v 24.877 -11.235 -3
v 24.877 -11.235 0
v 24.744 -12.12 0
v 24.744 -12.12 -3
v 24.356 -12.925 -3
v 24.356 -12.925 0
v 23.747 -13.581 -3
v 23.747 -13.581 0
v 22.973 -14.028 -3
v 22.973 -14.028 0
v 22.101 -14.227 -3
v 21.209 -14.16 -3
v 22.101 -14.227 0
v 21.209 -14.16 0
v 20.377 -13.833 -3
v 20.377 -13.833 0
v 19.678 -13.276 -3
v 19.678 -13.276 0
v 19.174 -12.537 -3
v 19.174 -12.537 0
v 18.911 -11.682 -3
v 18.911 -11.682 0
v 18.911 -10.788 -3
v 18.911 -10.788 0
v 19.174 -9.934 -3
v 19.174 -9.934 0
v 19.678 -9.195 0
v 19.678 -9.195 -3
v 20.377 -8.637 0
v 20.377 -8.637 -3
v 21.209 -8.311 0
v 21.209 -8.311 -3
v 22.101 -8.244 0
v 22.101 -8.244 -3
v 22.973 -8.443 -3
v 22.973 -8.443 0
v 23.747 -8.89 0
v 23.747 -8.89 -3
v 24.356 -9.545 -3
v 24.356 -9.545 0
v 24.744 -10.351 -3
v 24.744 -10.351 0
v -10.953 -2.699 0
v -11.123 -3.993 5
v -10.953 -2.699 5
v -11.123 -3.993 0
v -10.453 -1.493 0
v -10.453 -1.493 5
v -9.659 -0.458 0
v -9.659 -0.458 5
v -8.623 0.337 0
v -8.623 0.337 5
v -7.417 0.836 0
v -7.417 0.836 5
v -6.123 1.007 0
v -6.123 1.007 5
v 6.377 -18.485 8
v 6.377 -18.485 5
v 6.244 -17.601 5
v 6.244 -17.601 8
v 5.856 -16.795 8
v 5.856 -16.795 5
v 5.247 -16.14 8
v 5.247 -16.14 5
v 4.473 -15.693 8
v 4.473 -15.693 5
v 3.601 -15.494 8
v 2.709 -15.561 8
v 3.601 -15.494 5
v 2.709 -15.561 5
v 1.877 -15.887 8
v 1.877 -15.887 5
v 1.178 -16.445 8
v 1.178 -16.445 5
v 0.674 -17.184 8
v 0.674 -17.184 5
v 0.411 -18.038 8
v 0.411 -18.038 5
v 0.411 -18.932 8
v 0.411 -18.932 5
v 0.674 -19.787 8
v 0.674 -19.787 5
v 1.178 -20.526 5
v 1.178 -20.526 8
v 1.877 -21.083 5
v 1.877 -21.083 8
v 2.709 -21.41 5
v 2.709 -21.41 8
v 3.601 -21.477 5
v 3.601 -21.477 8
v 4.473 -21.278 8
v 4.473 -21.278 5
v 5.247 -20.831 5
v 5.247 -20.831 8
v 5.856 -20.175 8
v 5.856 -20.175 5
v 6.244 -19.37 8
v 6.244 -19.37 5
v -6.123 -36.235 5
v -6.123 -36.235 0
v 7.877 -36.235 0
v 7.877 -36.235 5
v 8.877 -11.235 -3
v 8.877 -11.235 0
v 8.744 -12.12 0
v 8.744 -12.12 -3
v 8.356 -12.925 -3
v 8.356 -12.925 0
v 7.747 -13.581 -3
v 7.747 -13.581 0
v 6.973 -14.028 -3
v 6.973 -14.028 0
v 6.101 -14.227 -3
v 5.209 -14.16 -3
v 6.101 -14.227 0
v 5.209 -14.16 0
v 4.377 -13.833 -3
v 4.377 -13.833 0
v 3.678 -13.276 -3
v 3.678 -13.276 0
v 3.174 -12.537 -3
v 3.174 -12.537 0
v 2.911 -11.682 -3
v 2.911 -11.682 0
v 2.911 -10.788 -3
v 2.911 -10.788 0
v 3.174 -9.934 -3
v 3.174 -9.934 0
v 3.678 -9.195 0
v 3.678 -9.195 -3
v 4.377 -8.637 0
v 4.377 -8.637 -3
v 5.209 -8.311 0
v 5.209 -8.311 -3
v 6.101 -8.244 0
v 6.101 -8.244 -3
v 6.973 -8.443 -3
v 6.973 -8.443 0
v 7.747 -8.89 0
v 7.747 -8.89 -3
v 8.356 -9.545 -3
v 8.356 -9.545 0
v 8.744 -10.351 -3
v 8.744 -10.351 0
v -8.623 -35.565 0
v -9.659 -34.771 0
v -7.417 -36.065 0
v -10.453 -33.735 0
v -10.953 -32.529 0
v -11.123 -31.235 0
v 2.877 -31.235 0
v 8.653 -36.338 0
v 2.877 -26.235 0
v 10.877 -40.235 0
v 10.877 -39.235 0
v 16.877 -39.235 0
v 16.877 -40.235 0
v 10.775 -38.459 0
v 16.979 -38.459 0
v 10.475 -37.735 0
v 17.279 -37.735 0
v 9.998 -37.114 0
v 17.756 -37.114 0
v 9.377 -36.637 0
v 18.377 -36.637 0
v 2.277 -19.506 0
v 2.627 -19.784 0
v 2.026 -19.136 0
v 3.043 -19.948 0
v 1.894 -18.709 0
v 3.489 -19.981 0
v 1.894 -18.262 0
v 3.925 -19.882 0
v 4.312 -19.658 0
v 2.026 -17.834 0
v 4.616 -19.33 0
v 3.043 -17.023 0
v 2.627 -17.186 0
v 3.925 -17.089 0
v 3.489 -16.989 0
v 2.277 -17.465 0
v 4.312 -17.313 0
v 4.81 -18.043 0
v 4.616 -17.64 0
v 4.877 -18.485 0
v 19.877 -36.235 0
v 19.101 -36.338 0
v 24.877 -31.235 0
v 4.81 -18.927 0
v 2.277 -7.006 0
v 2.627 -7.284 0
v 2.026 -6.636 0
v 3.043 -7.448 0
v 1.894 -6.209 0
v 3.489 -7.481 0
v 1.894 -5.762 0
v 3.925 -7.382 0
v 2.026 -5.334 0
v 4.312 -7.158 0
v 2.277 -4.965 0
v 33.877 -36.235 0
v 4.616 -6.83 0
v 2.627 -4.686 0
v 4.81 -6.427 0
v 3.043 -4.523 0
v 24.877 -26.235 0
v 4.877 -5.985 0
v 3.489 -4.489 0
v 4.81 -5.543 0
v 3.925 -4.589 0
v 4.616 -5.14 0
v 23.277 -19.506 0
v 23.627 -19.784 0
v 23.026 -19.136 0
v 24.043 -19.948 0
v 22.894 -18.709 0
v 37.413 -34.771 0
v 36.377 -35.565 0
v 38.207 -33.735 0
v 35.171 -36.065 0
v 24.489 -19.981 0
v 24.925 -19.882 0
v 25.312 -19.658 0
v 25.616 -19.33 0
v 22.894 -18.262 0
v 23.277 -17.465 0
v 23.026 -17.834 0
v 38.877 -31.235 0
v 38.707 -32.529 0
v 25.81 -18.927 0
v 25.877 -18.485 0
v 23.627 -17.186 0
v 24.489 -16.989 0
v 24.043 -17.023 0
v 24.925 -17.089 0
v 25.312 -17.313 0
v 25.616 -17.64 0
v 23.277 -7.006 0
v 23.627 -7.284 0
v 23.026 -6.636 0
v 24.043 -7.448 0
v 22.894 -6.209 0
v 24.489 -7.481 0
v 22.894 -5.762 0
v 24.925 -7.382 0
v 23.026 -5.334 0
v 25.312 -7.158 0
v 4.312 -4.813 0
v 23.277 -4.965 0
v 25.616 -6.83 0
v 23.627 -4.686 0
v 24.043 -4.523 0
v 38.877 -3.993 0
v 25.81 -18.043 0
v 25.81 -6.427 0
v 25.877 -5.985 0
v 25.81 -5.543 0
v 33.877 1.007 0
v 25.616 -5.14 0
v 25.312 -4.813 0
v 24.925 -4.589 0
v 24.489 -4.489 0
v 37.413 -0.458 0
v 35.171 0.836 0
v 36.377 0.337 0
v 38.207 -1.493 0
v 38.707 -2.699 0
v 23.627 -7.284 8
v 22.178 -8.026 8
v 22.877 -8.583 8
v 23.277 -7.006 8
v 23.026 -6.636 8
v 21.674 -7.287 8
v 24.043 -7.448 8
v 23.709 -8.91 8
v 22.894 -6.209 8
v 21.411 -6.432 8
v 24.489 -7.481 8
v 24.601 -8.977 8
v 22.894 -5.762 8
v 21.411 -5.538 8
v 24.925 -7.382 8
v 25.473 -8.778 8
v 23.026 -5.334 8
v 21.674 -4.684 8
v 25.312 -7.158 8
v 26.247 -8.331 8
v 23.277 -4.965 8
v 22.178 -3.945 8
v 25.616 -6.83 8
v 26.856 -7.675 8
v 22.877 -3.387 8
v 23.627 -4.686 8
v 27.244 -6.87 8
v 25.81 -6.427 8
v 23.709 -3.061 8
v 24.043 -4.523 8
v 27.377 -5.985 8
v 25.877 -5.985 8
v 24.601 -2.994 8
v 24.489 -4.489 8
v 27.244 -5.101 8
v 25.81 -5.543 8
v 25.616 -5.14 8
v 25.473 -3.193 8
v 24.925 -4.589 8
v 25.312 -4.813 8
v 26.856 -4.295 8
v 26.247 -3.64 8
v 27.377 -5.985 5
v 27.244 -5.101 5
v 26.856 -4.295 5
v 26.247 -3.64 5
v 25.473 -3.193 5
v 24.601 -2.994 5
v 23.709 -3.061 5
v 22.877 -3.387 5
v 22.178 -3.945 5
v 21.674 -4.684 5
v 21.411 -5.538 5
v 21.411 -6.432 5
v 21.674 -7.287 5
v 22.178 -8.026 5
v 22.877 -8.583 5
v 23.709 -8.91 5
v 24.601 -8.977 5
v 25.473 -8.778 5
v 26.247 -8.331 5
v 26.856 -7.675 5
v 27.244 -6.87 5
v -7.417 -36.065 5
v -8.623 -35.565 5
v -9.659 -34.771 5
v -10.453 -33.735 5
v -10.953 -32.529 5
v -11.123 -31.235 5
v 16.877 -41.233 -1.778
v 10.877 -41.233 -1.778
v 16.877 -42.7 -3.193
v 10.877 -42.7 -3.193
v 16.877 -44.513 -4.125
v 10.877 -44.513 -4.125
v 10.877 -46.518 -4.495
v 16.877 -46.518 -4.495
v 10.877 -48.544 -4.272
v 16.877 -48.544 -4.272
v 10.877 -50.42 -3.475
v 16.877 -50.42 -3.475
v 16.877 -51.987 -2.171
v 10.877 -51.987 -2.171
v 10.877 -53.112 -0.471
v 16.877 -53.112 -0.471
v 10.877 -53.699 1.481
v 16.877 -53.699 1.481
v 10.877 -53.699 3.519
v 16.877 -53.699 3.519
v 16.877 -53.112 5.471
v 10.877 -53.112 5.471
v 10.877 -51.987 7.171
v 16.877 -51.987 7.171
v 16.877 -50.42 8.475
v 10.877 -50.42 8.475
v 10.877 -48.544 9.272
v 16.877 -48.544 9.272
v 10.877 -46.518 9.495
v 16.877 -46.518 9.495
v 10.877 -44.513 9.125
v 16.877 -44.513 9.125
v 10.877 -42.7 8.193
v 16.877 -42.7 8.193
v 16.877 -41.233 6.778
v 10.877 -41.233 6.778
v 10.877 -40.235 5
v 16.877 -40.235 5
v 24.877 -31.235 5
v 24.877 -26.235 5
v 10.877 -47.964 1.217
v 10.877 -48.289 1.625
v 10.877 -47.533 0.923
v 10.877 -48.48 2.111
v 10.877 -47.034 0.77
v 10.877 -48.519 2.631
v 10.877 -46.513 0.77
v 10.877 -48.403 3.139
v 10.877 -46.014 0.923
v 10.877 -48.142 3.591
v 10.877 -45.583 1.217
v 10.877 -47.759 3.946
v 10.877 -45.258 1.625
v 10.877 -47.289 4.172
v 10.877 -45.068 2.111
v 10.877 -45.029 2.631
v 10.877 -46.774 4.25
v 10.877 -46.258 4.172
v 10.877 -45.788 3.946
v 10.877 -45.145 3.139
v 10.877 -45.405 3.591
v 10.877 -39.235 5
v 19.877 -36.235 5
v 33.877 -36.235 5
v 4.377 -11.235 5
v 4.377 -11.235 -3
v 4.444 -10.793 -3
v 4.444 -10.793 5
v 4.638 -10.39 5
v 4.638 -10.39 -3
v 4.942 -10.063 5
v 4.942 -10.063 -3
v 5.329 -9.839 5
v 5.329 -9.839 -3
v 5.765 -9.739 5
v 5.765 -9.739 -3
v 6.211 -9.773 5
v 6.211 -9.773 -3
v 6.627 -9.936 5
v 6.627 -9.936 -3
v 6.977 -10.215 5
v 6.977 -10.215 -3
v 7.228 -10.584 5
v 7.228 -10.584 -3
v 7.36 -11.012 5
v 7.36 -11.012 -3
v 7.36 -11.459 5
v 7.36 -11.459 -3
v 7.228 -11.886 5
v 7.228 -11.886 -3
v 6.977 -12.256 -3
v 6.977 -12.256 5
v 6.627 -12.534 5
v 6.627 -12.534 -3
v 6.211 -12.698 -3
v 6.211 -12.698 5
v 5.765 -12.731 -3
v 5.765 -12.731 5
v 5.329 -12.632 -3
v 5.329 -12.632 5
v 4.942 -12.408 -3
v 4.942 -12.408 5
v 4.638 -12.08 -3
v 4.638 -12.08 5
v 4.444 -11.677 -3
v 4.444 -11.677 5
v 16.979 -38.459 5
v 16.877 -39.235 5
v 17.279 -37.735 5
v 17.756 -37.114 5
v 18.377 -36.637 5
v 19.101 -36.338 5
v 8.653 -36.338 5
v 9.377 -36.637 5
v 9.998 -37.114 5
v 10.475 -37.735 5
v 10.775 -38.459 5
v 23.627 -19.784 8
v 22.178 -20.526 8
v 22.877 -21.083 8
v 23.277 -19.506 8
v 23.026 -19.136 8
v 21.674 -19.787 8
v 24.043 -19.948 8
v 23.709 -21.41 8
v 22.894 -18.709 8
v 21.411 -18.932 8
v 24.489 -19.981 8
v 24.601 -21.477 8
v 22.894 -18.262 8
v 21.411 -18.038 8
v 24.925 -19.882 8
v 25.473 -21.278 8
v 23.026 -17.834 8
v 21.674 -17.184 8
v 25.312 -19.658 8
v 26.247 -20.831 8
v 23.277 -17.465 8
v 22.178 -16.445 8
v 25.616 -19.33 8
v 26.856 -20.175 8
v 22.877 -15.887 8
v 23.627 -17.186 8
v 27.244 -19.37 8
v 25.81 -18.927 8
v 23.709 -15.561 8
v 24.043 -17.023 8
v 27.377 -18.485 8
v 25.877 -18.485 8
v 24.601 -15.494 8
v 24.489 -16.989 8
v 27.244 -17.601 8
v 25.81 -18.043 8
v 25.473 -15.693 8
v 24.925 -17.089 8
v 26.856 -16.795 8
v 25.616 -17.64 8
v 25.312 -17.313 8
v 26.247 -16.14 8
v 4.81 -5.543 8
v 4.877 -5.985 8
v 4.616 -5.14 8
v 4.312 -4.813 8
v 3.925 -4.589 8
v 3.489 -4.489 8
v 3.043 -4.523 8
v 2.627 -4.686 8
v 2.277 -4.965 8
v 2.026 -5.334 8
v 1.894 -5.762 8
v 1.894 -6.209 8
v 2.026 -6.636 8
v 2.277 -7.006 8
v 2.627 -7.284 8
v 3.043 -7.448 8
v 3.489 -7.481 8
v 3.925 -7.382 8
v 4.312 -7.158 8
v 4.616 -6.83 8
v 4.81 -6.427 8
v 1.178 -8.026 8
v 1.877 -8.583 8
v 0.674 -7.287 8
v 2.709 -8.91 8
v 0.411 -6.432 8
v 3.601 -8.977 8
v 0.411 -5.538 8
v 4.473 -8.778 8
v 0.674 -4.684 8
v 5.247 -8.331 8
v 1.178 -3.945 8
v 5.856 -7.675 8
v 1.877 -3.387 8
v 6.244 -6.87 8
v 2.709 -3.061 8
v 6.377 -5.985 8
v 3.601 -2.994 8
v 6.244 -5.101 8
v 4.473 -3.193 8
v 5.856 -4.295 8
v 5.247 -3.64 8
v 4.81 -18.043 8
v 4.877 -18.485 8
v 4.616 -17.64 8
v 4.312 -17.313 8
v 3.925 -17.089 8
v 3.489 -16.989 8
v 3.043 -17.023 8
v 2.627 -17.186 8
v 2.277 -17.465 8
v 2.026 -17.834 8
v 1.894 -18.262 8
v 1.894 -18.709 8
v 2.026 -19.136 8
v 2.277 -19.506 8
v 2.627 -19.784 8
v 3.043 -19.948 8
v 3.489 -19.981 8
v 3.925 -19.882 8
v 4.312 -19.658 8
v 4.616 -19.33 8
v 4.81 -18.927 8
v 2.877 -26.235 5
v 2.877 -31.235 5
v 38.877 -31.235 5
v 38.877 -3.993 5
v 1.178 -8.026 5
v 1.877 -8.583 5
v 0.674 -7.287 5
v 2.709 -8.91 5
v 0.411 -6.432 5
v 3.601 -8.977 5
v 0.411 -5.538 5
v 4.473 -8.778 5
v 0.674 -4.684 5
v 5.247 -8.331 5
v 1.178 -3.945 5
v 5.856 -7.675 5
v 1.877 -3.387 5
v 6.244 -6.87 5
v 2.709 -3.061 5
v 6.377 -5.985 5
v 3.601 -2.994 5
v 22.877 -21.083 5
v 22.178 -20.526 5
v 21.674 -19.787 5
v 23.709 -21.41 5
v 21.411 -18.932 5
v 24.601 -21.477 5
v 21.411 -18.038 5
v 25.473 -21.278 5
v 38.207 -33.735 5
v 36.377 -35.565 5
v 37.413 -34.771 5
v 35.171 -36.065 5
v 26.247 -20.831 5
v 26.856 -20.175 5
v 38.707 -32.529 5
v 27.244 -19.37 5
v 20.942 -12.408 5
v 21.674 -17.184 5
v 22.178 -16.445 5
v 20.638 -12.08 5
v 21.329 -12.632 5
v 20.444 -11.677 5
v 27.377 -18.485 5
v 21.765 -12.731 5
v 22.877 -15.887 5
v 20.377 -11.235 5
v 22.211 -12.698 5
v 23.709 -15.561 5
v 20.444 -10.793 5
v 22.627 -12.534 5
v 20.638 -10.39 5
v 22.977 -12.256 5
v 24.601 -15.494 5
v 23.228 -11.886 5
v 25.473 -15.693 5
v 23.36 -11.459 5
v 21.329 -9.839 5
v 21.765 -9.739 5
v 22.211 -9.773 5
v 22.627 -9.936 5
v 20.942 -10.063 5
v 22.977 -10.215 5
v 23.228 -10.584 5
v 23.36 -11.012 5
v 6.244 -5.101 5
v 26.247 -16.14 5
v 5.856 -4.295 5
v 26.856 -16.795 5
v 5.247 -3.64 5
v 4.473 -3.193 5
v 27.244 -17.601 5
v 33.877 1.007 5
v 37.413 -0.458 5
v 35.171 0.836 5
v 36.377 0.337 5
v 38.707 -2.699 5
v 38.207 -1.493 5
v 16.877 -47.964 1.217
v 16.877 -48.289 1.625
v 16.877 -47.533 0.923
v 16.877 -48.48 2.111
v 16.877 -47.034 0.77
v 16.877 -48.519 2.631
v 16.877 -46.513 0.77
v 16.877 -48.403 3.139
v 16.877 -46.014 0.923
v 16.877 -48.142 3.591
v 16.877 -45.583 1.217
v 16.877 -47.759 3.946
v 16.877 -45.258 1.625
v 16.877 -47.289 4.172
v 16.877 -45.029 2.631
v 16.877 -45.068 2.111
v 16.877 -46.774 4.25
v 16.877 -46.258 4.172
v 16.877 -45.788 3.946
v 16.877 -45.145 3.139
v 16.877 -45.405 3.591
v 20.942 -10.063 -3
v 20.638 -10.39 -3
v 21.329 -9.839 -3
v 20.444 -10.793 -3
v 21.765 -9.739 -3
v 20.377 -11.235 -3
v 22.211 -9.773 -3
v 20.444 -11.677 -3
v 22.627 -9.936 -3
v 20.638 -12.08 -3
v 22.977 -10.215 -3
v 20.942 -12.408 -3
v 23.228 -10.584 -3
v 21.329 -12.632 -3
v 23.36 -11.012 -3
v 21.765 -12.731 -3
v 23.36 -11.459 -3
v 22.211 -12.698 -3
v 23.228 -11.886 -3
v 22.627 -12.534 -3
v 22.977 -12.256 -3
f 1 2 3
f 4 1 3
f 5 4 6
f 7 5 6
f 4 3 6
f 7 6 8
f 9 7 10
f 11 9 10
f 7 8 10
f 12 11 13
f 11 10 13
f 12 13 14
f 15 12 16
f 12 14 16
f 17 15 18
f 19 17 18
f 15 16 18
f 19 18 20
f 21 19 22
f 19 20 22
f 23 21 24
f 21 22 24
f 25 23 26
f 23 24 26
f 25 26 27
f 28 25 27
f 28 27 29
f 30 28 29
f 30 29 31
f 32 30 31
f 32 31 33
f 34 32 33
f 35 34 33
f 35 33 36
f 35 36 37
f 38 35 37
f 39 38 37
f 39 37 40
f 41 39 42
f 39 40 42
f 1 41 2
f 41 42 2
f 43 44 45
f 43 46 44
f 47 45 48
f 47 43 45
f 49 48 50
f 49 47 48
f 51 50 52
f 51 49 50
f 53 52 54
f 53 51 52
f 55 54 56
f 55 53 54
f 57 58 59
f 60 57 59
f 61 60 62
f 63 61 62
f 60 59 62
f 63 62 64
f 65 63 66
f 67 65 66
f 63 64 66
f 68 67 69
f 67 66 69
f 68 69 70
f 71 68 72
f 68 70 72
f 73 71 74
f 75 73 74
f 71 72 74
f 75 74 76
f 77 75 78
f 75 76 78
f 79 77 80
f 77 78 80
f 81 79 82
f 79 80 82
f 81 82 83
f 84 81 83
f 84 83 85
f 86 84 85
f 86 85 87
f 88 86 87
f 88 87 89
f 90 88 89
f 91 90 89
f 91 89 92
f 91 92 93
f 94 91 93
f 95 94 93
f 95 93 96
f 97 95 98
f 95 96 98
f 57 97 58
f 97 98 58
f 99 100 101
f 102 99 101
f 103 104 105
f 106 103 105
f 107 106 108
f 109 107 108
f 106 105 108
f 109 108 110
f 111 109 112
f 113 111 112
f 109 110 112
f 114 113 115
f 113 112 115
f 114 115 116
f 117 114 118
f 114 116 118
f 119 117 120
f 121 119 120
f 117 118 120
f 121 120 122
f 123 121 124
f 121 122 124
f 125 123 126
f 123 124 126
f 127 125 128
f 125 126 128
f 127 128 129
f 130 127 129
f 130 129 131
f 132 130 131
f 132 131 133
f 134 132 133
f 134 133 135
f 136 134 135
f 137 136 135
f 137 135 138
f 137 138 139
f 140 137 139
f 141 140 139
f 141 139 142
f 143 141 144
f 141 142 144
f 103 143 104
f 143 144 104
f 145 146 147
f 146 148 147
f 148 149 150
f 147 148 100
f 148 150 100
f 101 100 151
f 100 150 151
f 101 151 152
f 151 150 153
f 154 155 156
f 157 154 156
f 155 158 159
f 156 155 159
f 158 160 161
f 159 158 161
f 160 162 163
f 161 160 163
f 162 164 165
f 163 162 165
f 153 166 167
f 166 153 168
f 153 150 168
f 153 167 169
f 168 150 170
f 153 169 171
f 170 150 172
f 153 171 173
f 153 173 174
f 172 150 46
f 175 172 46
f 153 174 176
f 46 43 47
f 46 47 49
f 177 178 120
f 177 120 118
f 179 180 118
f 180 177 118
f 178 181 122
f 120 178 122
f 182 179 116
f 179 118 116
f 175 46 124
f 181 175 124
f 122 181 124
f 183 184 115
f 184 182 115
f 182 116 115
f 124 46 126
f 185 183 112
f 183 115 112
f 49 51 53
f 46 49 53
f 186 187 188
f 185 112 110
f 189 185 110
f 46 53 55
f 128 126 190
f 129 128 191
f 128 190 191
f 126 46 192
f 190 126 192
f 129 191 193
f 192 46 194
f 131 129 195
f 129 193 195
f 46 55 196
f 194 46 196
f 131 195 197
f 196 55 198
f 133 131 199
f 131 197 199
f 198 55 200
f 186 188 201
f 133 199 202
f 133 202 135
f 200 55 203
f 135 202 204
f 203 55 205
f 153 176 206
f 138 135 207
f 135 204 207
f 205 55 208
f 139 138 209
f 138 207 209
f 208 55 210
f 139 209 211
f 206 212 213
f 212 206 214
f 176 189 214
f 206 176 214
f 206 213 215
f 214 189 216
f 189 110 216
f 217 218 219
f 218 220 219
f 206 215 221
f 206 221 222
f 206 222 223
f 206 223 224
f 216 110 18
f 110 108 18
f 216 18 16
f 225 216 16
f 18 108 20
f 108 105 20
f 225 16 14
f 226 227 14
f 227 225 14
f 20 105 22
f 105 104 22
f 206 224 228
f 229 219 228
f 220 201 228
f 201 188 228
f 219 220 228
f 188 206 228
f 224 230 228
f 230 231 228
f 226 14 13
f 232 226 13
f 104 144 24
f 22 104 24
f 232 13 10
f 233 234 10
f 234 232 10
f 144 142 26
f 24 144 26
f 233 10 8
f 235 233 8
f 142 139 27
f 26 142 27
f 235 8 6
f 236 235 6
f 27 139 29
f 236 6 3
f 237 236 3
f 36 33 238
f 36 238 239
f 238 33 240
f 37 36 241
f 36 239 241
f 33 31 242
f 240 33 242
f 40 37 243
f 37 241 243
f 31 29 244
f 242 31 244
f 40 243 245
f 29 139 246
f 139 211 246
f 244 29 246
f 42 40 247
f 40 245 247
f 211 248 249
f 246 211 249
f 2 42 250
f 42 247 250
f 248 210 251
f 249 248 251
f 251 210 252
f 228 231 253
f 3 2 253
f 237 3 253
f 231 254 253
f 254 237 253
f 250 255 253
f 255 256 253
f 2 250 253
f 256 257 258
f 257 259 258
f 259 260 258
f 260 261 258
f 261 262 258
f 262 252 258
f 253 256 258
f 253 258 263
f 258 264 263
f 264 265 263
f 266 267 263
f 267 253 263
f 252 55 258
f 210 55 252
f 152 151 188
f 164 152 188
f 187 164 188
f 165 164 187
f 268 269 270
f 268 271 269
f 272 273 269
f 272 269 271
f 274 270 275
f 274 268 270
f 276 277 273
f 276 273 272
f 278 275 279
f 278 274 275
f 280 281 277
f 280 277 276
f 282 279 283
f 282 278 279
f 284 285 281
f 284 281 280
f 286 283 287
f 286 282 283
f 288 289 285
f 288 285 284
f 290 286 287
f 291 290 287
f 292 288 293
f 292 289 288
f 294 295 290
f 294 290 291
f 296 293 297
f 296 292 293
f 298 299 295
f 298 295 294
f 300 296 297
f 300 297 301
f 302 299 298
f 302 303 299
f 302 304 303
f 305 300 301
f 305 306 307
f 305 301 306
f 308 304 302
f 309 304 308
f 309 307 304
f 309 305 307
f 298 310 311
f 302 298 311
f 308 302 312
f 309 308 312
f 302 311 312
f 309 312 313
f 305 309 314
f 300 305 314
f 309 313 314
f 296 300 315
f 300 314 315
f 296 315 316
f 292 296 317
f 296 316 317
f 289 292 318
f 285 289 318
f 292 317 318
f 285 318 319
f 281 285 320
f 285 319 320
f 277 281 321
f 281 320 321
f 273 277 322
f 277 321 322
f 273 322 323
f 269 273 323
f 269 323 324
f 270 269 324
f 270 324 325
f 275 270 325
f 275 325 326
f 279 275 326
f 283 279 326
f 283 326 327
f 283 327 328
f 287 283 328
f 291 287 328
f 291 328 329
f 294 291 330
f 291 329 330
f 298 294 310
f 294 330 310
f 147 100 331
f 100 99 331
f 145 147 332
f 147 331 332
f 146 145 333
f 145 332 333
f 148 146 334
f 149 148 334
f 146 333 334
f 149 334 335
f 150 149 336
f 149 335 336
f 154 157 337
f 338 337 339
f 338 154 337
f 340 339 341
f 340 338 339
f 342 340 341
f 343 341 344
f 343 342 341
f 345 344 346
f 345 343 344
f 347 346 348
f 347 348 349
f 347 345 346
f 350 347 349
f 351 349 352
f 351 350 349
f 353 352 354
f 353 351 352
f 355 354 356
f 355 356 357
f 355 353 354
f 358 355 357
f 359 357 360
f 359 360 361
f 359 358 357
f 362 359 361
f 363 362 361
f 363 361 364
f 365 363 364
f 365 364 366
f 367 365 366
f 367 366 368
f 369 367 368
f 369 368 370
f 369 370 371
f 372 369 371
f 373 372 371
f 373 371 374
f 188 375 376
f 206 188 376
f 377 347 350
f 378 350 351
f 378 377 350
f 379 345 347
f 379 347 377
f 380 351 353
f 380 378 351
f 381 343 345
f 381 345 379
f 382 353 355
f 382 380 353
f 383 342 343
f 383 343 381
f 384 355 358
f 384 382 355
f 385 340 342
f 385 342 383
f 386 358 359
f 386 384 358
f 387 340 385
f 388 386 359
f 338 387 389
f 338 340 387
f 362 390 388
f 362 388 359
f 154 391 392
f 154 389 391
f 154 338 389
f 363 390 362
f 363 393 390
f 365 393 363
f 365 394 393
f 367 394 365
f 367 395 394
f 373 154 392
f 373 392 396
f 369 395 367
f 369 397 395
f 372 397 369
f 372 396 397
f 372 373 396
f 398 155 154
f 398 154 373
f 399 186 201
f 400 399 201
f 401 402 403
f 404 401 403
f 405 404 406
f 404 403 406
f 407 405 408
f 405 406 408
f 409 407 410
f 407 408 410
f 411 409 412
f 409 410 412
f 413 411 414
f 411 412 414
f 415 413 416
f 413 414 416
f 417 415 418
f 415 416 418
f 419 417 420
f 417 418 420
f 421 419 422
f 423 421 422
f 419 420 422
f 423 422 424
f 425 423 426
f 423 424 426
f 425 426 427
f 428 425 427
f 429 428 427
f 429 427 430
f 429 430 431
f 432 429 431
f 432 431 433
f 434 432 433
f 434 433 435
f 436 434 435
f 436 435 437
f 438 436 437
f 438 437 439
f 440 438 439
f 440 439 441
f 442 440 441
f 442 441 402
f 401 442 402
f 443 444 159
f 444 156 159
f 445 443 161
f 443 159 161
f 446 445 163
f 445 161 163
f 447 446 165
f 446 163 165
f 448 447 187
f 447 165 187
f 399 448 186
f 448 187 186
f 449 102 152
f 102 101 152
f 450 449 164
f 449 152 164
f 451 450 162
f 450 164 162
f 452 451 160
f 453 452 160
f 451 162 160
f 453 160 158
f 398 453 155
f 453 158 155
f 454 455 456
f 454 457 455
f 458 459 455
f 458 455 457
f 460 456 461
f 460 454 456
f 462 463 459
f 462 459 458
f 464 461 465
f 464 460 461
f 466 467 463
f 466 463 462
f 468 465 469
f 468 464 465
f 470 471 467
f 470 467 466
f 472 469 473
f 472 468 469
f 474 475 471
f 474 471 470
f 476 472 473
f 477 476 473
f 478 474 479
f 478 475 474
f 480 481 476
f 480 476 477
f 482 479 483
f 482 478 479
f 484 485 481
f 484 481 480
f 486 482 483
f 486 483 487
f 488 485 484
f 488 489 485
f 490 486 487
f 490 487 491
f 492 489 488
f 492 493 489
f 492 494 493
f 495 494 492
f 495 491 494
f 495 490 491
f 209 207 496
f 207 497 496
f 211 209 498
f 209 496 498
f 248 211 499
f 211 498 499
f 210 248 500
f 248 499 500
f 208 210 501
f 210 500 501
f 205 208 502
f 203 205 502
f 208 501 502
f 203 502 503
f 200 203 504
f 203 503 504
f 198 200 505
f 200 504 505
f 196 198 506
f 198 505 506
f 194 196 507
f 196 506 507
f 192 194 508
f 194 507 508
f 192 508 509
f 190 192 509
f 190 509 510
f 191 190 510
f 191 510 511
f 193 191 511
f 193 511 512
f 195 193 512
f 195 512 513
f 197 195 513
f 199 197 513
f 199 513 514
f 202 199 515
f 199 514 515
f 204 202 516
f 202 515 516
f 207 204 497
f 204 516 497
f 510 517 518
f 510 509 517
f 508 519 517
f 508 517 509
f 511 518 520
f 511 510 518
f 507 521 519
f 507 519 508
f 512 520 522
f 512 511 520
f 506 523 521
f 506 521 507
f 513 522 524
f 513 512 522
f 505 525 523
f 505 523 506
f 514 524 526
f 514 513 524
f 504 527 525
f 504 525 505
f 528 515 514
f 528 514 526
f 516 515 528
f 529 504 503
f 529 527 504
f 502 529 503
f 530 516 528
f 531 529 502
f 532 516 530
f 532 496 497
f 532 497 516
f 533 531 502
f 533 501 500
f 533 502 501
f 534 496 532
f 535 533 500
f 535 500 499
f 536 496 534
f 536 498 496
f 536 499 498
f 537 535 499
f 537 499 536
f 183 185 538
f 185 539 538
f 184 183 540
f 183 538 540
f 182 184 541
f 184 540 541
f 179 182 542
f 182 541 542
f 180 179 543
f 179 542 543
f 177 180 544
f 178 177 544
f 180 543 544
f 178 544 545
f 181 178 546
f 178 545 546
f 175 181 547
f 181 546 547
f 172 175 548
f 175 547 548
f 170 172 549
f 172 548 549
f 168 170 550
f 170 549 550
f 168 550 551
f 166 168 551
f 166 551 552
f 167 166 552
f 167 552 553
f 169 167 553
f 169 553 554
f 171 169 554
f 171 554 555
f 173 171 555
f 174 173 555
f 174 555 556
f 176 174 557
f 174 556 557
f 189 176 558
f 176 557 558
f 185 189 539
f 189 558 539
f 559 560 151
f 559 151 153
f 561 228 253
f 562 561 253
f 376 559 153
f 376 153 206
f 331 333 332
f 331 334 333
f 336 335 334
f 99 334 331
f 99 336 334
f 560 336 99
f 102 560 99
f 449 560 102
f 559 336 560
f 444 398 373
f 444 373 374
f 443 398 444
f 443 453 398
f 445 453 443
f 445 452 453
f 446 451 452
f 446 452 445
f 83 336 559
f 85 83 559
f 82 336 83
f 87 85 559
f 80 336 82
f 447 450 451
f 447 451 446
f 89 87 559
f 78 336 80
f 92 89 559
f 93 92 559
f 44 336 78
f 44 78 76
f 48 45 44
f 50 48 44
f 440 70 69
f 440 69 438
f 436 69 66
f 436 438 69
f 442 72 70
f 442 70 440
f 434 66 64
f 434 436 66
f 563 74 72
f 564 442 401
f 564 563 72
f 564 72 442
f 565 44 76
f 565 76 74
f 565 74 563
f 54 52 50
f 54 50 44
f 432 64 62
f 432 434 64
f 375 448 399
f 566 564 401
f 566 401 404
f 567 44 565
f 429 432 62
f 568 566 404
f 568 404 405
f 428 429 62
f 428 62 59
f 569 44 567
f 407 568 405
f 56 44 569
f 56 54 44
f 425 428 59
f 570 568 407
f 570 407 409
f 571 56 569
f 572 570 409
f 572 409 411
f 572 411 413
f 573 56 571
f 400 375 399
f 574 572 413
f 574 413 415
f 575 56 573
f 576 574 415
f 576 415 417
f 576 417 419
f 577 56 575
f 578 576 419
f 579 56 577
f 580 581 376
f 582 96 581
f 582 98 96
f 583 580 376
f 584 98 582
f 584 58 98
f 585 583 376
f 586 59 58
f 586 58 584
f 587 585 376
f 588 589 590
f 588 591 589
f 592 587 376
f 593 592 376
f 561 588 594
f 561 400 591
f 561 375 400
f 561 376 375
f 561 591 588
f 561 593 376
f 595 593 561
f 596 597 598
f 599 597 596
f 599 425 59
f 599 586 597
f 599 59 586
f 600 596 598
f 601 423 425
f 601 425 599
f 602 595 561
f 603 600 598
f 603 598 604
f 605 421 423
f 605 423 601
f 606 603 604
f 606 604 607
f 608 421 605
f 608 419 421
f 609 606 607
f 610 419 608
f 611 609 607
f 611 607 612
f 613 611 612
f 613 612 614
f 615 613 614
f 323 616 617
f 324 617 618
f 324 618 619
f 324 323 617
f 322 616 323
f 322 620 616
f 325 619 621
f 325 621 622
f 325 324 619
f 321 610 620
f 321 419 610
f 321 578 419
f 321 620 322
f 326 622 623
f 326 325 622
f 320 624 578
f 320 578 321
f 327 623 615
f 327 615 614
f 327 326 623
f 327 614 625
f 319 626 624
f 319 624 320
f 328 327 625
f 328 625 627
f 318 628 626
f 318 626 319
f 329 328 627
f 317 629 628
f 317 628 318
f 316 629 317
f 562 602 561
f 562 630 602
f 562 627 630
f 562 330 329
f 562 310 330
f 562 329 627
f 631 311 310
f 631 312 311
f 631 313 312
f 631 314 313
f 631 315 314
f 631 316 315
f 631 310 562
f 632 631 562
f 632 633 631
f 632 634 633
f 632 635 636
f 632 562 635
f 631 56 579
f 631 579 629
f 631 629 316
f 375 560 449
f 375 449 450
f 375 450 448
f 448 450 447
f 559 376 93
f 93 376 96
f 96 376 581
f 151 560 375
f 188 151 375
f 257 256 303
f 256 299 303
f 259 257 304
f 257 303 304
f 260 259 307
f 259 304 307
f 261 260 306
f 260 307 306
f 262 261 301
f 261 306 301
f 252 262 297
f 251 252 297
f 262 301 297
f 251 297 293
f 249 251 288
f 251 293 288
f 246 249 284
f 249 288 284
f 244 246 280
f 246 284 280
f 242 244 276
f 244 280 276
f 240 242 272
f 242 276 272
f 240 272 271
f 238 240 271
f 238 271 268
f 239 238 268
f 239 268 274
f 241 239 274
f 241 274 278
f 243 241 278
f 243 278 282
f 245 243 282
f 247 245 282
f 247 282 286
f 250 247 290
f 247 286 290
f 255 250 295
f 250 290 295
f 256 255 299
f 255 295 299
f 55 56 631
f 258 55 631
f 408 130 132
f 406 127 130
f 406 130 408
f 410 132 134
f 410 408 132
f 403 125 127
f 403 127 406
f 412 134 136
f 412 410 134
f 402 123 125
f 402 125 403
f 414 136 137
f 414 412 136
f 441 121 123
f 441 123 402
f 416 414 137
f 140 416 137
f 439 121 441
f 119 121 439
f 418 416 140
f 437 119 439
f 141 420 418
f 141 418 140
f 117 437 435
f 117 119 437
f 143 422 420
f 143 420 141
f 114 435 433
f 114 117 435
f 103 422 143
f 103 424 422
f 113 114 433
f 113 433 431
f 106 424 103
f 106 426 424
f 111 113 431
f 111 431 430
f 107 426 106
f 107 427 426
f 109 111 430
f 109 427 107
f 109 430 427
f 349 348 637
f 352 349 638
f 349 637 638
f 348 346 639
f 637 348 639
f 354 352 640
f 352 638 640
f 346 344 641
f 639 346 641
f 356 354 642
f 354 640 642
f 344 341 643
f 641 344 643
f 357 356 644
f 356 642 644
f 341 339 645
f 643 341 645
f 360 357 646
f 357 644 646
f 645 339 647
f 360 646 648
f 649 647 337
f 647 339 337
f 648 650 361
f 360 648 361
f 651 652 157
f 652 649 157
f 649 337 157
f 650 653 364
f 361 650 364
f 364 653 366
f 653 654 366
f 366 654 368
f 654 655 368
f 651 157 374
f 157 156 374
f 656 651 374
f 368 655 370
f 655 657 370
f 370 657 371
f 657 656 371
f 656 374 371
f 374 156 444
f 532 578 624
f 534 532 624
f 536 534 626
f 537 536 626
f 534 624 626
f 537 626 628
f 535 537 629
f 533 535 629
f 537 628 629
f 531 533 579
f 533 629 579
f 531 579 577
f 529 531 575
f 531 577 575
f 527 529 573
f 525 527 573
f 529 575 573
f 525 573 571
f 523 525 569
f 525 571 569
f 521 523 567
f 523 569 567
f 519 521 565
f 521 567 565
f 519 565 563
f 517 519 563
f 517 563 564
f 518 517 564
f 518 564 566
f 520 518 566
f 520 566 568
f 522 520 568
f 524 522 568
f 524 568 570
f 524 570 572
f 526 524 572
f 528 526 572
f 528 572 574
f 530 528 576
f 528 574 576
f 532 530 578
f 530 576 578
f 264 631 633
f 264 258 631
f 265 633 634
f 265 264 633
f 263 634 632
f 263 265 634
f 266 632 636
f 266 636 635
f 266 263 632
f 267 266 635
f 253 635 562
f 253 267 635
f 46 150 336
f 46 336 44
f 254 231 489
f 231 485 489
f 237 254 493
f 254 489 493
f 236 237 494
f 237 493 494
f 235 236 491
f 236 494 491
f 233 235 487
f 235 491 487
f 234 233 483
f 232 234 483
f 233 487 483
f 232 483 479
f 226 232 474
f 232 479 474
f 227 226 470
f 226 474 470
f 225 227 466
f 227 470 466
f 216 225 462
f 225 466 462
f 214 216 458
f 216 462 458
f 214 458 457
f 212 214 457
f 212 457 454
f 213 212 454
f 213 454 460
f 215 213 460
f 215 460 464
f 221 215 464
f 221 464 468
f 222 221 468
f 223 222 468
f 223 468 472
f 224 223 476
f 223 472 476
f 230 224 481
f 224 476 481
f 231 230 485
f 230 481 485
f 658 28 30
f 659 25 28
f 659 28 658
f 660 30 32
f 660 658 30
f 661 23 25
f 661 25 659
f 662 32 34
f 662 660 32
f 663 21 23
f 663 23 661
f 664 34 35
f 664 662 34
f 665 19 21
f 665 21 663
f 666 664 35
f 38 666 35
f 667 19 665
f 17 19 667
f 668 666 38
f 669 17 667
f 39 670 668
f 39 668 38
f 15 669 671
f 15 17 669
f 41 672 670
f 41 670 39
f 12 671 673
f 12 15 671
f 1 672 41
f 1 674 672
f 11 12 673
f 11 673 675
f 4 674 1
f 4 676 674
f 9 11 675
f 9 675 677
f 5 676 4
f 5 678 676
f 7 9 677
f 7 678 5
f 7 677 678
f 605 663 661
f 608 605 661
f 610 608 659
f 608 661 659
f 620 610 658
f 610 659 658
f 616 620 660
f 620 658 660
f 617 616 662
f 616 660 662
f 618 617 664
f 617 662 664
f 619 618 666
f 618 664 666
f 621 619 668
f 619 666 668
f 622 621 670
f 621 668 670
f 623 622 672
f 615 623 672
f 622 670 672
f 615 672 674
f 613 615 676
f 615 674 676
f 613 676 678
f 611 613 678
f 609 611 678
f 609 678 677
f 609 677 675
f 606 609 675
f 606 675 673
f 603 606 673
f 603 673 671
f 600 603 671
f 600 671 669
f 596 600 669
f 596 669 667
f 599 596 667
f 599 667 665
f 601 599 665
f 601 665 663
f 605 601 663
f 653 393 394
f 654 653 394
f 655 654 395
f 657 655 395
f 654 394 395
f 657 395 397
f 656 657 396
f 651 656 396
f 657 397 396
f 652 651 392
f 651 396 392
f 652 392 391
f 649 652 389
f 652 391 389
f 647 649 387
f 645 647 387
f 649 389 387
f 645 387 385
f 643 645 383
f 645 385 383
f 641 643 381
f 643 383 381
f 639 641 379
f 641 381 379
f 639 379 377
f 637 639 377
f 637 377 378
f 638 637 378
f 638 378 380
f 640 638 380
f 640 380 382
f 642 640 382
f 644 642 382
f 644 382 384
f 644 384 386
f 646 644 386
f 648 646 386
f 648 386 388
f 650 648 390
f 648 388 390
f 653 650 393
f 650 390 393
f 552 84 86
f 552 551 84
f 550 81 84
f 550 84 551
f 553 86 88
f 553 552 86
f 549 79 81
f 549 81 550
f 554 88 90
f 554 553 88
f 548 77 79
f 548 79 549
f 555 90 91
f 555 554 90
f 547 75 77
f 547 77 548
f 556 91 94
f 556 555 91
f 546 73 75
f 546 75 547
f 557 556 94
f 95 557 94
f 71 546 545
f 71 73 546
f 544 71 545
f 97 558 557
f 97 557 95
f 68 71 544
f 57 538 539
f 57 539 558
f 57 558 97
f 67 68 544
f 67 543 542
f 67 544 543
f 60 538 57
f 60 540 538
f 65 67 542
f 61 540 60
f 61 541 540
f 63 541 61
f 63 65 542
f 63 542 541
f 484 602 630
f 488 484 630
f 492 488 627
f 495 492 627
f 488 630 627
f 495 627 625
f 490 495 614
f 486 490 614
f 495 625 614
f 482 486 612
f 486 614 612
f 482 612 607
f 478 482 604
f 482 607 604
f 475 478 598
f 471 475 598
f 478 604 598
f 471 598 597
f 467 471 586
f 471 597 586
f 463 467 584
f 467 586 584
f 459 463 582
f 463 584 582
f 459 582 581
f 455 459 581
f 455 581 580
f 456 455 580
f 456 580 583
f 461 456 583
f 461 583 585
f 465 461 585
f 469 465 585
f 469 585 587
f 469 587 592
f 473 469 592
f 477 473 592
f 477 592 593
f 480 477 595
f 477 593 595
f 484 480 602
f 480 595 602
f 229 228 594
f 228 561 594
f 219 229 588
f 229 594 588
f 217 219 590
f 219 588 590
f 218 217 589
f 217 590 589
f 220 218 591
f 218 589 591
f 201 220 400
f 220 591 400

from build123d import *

# Parameters (mm, degrees)
ESQUISSE1_W                     = 50
ESQUISSE1_H                     = 48
BOSS_EXTRU_1_DEPTH              = 5
ESQUISSE2_R                     = 3
ESQUISSE2_R_2                   = 1.5
BOSS_EXTRU_2_DEPTH              = 3
R_P_TITION_LIN_AIRE1_COUNT      = 2
R_P_TITION_LIN_AIRE1_PITCH      = 21
R_P_TITION_LIN_AIRE1_COUNT_DIR2 = 2
R_P_TITION_LIN_AIRE1_PITCH_DIR2 = 12.5
ESQUISSE4_W                     = 6
ESQUISSE4_H                     = 5
BOSS_EXTRU_3_DEPTH              = 4
ESQUISSE5_R                     = 7
BOSS_EXTRU_4_DEPTH              = 6
ESQUISSE6_R                     = 1.75
ENL_V_MAT_EXTRU_1_DEPTH         = 6
ESQUISSE7_W                     = 50
ESQUISSE7_H                     = 10.758119029
ENL_V_MAT_EXTRU_2_DEPTH         = 10
CONG_2_R                        = 5
CONG_3_R                        = 3
ESQUISSE9_R                     = 1.5
ENL_V_MAT_EXTRU_3_DEPTH         = 70.161233188
ESQUISSE10_W                    = 22
ESQUISSE10_H                    = 5
ENL_V_MAT_EXTRU_4_DEPTH         = 10
ESQUISSE11_R                    = 3
BOSS_EXTRU_5_DEPTH              = 3
ESQUISSE12_R                    = 1.5
ENL_V_MAT_EXTRU_5_DEPTH         = 68.522412398


with BuildPart() as part:
    # Esquisse1 → Boss.-Extru.1 (new body)
    with BuildSketch(Plane.XY):
        with Locations((13.877005348, -12.235294118)):
            Rectangle(ESQUISSE1_W, ESQUISSE1_H)
    extrude(amount=BOSS_EXTRU_1_DEPTH)

    # Esquisse2 → Boss.-Extru.2 (add)
    with BuildSketch(Plane.XY.offset(5)):
        with Locations((3.377005348, -5.985294118)):
            Circle(ESQUISSE2_R)
        with Locations((3.377005348, -5.985294118)):
            Circle(ESQUISSE2_R_2, mode=Mode.SUBTRACT)
    boss_extru_2 = extrude(amount=BOSS_EXTRU_2_DEPTH)

    # Répétition linéaire1: Boss.-Extru.2 2 × 2
    with Locations(*[(i * R_P_TITION_LIN_AIRE1_PITCH, -j * R_P_TITION_LIN_AIRE1_PITCH_DIR2, 0) for i in range(R_P_TITION_LIN_AIRE1_COUNT) for j in range(R_P_TITION_LIN_AIRE1_COUNT_DIR2) if (i, j) != (0, 0)]):
        add(boss_extru_2)

    # Esquisse4 → Boss.-Extru.3 (add)
    with BuildSketch(Plane(origin=(0, -36.235294118, 0), x_dir=(-1, 0, 0), z_dir=(0, -1, 0))):
        with Locations((-13.877005348, -2.5)):
            Rectangle(ESQUISSE4_W, ESQUISSE4_H)
    extrude(amount=BOSS_EXTRU_3_DEPTH)

    # Esquisse5 → Boss.-Extru.4 (add)
    with BuildSketch(Plane.ZY.offset(-10.877005348)):
        with Locations((2.5, -46.773642533)):
            Circle(ESQUISSE5_R)
    extrude(amount=-BOSS_EXTRU_4_DEPTH)

    # Esquisse6 → Enlèv. mat.-Extru.1 (cut)
    with BuildSketch(Plane.ZY.offset(-10.877005348)):
        with Locations((2.5, -46.773642533)):
            Circle(ESQUISSE6_R)
    extrude(amount=-ENL_V_MAT_EXTRU_1_DEPTH, mode=Mode.SUBTRACT)

    # Esquisse7 → Enlèv. mat.-Extru.2 (cut)
    with BuildSketch(Plane.XY.offset(5)):
        with Locations((13.877005348, 6.385646368)):
            Rectangle(ESQUISSE7_W, ESQUISSE7_H)
    extrude(amount=-ENL_V_MAT_EXTRU_2_DEPTH, mode=Mode.SUBTRACT)

    # Congé2
    cong_2_edges = [part.edges().sort_by_distance(p)[0] for p in [
        (38.877005348, 1.006586853, 2.5),
        (-11.122994652, 1.006586853, 2.5),
        (38.877005348, -36.235294118, 2.5),
        (-11.122994652, -36.235294118, 2.5),
    ]]
    fillet(cong_2_edges, radius=CONG_2_R)

    # Congé3
    cong_3_edges = [part.edges().sort_by_distance(p)[0] for p in [
        (16.877005348, -36.235294118, 2.5),
        (10.877005348, -36.235294118, 2.5),
    ]]
    fillet(cong_3_edges, radius=CONG_3_R)

    # Esquisse9 → Enlèv. mat.-Extru.3 (cut, through all)
    with BuildSketch(Plane.XY.offset(15)):
        with Locations((3.377005348, -5.985294118)):
            Circle(ESQUISSE9_R)
        with Locations((24.377005348, -5.985294118)):
            Circle(ESQUISSE9_R)
        with Locations((24.377005348, -18.485294118)):
            Circle(ESQUISSE9_R)
        with Locations((3.377005348, -18.485294118)):
            Circle(ESQUISSE9_R)
    extrude(amount=-ENL_V_MAT_EXTRU_3_DEPTH, mode=Mode.SUBTRACT)

    # Esquisse10 → Enlèv. mat.-Extru.4 (cut)
    with BuildSketch(Plane.XY.offset(5)):
        with Locations((13.877005348, -28.735294118)):
            Rectangle(ESQUISSE10_W, ESQUISSE10_H)
    extrude(amount=-ENL_V_MAT_EXTRU_4_DEPTH, mode=Mode.SUBTRACT)

    # Esquisse11 → Boss.-Extru.5 (add)
    with BuildSketch(Plane(origin=(0, 0, 0), x_dir=(-1, 0, 0), z_dir=(0, 0, -1))):
        with Locations(Location((-21.877005348, -11.235294118, 0), (0, 0, 180))):
            Circle(ESQUISSE11_R)
        with Locations(Location((-5.877005348, -11.235294118, 0), (0, 0, 180))):
            Circle(ESQUISSE11_R)
    extrude(amount=BOSS_EXTRU_5_DEPTH)

    # Esquisse12 → Enlèv. mat.-Extru.5 (cut, through all)
    with BuildSketch(Plane(origin=(0, 0, -3), x_dir=(-1, 0, 0), z_dir=(0, 0, -1))):
        with Locations((-21.877005348, -11.235294118)):
            Circle(ESQUISSE12_R)
        with Locations((-5.877005348, -11.235294118)):
            Circle(ESQUISSE12_R)
    extrude(amount=-ENL_V_MAT_EXTRU_5_DEPTH, mode=Mode.SUBTRACT)


solid = part.part
